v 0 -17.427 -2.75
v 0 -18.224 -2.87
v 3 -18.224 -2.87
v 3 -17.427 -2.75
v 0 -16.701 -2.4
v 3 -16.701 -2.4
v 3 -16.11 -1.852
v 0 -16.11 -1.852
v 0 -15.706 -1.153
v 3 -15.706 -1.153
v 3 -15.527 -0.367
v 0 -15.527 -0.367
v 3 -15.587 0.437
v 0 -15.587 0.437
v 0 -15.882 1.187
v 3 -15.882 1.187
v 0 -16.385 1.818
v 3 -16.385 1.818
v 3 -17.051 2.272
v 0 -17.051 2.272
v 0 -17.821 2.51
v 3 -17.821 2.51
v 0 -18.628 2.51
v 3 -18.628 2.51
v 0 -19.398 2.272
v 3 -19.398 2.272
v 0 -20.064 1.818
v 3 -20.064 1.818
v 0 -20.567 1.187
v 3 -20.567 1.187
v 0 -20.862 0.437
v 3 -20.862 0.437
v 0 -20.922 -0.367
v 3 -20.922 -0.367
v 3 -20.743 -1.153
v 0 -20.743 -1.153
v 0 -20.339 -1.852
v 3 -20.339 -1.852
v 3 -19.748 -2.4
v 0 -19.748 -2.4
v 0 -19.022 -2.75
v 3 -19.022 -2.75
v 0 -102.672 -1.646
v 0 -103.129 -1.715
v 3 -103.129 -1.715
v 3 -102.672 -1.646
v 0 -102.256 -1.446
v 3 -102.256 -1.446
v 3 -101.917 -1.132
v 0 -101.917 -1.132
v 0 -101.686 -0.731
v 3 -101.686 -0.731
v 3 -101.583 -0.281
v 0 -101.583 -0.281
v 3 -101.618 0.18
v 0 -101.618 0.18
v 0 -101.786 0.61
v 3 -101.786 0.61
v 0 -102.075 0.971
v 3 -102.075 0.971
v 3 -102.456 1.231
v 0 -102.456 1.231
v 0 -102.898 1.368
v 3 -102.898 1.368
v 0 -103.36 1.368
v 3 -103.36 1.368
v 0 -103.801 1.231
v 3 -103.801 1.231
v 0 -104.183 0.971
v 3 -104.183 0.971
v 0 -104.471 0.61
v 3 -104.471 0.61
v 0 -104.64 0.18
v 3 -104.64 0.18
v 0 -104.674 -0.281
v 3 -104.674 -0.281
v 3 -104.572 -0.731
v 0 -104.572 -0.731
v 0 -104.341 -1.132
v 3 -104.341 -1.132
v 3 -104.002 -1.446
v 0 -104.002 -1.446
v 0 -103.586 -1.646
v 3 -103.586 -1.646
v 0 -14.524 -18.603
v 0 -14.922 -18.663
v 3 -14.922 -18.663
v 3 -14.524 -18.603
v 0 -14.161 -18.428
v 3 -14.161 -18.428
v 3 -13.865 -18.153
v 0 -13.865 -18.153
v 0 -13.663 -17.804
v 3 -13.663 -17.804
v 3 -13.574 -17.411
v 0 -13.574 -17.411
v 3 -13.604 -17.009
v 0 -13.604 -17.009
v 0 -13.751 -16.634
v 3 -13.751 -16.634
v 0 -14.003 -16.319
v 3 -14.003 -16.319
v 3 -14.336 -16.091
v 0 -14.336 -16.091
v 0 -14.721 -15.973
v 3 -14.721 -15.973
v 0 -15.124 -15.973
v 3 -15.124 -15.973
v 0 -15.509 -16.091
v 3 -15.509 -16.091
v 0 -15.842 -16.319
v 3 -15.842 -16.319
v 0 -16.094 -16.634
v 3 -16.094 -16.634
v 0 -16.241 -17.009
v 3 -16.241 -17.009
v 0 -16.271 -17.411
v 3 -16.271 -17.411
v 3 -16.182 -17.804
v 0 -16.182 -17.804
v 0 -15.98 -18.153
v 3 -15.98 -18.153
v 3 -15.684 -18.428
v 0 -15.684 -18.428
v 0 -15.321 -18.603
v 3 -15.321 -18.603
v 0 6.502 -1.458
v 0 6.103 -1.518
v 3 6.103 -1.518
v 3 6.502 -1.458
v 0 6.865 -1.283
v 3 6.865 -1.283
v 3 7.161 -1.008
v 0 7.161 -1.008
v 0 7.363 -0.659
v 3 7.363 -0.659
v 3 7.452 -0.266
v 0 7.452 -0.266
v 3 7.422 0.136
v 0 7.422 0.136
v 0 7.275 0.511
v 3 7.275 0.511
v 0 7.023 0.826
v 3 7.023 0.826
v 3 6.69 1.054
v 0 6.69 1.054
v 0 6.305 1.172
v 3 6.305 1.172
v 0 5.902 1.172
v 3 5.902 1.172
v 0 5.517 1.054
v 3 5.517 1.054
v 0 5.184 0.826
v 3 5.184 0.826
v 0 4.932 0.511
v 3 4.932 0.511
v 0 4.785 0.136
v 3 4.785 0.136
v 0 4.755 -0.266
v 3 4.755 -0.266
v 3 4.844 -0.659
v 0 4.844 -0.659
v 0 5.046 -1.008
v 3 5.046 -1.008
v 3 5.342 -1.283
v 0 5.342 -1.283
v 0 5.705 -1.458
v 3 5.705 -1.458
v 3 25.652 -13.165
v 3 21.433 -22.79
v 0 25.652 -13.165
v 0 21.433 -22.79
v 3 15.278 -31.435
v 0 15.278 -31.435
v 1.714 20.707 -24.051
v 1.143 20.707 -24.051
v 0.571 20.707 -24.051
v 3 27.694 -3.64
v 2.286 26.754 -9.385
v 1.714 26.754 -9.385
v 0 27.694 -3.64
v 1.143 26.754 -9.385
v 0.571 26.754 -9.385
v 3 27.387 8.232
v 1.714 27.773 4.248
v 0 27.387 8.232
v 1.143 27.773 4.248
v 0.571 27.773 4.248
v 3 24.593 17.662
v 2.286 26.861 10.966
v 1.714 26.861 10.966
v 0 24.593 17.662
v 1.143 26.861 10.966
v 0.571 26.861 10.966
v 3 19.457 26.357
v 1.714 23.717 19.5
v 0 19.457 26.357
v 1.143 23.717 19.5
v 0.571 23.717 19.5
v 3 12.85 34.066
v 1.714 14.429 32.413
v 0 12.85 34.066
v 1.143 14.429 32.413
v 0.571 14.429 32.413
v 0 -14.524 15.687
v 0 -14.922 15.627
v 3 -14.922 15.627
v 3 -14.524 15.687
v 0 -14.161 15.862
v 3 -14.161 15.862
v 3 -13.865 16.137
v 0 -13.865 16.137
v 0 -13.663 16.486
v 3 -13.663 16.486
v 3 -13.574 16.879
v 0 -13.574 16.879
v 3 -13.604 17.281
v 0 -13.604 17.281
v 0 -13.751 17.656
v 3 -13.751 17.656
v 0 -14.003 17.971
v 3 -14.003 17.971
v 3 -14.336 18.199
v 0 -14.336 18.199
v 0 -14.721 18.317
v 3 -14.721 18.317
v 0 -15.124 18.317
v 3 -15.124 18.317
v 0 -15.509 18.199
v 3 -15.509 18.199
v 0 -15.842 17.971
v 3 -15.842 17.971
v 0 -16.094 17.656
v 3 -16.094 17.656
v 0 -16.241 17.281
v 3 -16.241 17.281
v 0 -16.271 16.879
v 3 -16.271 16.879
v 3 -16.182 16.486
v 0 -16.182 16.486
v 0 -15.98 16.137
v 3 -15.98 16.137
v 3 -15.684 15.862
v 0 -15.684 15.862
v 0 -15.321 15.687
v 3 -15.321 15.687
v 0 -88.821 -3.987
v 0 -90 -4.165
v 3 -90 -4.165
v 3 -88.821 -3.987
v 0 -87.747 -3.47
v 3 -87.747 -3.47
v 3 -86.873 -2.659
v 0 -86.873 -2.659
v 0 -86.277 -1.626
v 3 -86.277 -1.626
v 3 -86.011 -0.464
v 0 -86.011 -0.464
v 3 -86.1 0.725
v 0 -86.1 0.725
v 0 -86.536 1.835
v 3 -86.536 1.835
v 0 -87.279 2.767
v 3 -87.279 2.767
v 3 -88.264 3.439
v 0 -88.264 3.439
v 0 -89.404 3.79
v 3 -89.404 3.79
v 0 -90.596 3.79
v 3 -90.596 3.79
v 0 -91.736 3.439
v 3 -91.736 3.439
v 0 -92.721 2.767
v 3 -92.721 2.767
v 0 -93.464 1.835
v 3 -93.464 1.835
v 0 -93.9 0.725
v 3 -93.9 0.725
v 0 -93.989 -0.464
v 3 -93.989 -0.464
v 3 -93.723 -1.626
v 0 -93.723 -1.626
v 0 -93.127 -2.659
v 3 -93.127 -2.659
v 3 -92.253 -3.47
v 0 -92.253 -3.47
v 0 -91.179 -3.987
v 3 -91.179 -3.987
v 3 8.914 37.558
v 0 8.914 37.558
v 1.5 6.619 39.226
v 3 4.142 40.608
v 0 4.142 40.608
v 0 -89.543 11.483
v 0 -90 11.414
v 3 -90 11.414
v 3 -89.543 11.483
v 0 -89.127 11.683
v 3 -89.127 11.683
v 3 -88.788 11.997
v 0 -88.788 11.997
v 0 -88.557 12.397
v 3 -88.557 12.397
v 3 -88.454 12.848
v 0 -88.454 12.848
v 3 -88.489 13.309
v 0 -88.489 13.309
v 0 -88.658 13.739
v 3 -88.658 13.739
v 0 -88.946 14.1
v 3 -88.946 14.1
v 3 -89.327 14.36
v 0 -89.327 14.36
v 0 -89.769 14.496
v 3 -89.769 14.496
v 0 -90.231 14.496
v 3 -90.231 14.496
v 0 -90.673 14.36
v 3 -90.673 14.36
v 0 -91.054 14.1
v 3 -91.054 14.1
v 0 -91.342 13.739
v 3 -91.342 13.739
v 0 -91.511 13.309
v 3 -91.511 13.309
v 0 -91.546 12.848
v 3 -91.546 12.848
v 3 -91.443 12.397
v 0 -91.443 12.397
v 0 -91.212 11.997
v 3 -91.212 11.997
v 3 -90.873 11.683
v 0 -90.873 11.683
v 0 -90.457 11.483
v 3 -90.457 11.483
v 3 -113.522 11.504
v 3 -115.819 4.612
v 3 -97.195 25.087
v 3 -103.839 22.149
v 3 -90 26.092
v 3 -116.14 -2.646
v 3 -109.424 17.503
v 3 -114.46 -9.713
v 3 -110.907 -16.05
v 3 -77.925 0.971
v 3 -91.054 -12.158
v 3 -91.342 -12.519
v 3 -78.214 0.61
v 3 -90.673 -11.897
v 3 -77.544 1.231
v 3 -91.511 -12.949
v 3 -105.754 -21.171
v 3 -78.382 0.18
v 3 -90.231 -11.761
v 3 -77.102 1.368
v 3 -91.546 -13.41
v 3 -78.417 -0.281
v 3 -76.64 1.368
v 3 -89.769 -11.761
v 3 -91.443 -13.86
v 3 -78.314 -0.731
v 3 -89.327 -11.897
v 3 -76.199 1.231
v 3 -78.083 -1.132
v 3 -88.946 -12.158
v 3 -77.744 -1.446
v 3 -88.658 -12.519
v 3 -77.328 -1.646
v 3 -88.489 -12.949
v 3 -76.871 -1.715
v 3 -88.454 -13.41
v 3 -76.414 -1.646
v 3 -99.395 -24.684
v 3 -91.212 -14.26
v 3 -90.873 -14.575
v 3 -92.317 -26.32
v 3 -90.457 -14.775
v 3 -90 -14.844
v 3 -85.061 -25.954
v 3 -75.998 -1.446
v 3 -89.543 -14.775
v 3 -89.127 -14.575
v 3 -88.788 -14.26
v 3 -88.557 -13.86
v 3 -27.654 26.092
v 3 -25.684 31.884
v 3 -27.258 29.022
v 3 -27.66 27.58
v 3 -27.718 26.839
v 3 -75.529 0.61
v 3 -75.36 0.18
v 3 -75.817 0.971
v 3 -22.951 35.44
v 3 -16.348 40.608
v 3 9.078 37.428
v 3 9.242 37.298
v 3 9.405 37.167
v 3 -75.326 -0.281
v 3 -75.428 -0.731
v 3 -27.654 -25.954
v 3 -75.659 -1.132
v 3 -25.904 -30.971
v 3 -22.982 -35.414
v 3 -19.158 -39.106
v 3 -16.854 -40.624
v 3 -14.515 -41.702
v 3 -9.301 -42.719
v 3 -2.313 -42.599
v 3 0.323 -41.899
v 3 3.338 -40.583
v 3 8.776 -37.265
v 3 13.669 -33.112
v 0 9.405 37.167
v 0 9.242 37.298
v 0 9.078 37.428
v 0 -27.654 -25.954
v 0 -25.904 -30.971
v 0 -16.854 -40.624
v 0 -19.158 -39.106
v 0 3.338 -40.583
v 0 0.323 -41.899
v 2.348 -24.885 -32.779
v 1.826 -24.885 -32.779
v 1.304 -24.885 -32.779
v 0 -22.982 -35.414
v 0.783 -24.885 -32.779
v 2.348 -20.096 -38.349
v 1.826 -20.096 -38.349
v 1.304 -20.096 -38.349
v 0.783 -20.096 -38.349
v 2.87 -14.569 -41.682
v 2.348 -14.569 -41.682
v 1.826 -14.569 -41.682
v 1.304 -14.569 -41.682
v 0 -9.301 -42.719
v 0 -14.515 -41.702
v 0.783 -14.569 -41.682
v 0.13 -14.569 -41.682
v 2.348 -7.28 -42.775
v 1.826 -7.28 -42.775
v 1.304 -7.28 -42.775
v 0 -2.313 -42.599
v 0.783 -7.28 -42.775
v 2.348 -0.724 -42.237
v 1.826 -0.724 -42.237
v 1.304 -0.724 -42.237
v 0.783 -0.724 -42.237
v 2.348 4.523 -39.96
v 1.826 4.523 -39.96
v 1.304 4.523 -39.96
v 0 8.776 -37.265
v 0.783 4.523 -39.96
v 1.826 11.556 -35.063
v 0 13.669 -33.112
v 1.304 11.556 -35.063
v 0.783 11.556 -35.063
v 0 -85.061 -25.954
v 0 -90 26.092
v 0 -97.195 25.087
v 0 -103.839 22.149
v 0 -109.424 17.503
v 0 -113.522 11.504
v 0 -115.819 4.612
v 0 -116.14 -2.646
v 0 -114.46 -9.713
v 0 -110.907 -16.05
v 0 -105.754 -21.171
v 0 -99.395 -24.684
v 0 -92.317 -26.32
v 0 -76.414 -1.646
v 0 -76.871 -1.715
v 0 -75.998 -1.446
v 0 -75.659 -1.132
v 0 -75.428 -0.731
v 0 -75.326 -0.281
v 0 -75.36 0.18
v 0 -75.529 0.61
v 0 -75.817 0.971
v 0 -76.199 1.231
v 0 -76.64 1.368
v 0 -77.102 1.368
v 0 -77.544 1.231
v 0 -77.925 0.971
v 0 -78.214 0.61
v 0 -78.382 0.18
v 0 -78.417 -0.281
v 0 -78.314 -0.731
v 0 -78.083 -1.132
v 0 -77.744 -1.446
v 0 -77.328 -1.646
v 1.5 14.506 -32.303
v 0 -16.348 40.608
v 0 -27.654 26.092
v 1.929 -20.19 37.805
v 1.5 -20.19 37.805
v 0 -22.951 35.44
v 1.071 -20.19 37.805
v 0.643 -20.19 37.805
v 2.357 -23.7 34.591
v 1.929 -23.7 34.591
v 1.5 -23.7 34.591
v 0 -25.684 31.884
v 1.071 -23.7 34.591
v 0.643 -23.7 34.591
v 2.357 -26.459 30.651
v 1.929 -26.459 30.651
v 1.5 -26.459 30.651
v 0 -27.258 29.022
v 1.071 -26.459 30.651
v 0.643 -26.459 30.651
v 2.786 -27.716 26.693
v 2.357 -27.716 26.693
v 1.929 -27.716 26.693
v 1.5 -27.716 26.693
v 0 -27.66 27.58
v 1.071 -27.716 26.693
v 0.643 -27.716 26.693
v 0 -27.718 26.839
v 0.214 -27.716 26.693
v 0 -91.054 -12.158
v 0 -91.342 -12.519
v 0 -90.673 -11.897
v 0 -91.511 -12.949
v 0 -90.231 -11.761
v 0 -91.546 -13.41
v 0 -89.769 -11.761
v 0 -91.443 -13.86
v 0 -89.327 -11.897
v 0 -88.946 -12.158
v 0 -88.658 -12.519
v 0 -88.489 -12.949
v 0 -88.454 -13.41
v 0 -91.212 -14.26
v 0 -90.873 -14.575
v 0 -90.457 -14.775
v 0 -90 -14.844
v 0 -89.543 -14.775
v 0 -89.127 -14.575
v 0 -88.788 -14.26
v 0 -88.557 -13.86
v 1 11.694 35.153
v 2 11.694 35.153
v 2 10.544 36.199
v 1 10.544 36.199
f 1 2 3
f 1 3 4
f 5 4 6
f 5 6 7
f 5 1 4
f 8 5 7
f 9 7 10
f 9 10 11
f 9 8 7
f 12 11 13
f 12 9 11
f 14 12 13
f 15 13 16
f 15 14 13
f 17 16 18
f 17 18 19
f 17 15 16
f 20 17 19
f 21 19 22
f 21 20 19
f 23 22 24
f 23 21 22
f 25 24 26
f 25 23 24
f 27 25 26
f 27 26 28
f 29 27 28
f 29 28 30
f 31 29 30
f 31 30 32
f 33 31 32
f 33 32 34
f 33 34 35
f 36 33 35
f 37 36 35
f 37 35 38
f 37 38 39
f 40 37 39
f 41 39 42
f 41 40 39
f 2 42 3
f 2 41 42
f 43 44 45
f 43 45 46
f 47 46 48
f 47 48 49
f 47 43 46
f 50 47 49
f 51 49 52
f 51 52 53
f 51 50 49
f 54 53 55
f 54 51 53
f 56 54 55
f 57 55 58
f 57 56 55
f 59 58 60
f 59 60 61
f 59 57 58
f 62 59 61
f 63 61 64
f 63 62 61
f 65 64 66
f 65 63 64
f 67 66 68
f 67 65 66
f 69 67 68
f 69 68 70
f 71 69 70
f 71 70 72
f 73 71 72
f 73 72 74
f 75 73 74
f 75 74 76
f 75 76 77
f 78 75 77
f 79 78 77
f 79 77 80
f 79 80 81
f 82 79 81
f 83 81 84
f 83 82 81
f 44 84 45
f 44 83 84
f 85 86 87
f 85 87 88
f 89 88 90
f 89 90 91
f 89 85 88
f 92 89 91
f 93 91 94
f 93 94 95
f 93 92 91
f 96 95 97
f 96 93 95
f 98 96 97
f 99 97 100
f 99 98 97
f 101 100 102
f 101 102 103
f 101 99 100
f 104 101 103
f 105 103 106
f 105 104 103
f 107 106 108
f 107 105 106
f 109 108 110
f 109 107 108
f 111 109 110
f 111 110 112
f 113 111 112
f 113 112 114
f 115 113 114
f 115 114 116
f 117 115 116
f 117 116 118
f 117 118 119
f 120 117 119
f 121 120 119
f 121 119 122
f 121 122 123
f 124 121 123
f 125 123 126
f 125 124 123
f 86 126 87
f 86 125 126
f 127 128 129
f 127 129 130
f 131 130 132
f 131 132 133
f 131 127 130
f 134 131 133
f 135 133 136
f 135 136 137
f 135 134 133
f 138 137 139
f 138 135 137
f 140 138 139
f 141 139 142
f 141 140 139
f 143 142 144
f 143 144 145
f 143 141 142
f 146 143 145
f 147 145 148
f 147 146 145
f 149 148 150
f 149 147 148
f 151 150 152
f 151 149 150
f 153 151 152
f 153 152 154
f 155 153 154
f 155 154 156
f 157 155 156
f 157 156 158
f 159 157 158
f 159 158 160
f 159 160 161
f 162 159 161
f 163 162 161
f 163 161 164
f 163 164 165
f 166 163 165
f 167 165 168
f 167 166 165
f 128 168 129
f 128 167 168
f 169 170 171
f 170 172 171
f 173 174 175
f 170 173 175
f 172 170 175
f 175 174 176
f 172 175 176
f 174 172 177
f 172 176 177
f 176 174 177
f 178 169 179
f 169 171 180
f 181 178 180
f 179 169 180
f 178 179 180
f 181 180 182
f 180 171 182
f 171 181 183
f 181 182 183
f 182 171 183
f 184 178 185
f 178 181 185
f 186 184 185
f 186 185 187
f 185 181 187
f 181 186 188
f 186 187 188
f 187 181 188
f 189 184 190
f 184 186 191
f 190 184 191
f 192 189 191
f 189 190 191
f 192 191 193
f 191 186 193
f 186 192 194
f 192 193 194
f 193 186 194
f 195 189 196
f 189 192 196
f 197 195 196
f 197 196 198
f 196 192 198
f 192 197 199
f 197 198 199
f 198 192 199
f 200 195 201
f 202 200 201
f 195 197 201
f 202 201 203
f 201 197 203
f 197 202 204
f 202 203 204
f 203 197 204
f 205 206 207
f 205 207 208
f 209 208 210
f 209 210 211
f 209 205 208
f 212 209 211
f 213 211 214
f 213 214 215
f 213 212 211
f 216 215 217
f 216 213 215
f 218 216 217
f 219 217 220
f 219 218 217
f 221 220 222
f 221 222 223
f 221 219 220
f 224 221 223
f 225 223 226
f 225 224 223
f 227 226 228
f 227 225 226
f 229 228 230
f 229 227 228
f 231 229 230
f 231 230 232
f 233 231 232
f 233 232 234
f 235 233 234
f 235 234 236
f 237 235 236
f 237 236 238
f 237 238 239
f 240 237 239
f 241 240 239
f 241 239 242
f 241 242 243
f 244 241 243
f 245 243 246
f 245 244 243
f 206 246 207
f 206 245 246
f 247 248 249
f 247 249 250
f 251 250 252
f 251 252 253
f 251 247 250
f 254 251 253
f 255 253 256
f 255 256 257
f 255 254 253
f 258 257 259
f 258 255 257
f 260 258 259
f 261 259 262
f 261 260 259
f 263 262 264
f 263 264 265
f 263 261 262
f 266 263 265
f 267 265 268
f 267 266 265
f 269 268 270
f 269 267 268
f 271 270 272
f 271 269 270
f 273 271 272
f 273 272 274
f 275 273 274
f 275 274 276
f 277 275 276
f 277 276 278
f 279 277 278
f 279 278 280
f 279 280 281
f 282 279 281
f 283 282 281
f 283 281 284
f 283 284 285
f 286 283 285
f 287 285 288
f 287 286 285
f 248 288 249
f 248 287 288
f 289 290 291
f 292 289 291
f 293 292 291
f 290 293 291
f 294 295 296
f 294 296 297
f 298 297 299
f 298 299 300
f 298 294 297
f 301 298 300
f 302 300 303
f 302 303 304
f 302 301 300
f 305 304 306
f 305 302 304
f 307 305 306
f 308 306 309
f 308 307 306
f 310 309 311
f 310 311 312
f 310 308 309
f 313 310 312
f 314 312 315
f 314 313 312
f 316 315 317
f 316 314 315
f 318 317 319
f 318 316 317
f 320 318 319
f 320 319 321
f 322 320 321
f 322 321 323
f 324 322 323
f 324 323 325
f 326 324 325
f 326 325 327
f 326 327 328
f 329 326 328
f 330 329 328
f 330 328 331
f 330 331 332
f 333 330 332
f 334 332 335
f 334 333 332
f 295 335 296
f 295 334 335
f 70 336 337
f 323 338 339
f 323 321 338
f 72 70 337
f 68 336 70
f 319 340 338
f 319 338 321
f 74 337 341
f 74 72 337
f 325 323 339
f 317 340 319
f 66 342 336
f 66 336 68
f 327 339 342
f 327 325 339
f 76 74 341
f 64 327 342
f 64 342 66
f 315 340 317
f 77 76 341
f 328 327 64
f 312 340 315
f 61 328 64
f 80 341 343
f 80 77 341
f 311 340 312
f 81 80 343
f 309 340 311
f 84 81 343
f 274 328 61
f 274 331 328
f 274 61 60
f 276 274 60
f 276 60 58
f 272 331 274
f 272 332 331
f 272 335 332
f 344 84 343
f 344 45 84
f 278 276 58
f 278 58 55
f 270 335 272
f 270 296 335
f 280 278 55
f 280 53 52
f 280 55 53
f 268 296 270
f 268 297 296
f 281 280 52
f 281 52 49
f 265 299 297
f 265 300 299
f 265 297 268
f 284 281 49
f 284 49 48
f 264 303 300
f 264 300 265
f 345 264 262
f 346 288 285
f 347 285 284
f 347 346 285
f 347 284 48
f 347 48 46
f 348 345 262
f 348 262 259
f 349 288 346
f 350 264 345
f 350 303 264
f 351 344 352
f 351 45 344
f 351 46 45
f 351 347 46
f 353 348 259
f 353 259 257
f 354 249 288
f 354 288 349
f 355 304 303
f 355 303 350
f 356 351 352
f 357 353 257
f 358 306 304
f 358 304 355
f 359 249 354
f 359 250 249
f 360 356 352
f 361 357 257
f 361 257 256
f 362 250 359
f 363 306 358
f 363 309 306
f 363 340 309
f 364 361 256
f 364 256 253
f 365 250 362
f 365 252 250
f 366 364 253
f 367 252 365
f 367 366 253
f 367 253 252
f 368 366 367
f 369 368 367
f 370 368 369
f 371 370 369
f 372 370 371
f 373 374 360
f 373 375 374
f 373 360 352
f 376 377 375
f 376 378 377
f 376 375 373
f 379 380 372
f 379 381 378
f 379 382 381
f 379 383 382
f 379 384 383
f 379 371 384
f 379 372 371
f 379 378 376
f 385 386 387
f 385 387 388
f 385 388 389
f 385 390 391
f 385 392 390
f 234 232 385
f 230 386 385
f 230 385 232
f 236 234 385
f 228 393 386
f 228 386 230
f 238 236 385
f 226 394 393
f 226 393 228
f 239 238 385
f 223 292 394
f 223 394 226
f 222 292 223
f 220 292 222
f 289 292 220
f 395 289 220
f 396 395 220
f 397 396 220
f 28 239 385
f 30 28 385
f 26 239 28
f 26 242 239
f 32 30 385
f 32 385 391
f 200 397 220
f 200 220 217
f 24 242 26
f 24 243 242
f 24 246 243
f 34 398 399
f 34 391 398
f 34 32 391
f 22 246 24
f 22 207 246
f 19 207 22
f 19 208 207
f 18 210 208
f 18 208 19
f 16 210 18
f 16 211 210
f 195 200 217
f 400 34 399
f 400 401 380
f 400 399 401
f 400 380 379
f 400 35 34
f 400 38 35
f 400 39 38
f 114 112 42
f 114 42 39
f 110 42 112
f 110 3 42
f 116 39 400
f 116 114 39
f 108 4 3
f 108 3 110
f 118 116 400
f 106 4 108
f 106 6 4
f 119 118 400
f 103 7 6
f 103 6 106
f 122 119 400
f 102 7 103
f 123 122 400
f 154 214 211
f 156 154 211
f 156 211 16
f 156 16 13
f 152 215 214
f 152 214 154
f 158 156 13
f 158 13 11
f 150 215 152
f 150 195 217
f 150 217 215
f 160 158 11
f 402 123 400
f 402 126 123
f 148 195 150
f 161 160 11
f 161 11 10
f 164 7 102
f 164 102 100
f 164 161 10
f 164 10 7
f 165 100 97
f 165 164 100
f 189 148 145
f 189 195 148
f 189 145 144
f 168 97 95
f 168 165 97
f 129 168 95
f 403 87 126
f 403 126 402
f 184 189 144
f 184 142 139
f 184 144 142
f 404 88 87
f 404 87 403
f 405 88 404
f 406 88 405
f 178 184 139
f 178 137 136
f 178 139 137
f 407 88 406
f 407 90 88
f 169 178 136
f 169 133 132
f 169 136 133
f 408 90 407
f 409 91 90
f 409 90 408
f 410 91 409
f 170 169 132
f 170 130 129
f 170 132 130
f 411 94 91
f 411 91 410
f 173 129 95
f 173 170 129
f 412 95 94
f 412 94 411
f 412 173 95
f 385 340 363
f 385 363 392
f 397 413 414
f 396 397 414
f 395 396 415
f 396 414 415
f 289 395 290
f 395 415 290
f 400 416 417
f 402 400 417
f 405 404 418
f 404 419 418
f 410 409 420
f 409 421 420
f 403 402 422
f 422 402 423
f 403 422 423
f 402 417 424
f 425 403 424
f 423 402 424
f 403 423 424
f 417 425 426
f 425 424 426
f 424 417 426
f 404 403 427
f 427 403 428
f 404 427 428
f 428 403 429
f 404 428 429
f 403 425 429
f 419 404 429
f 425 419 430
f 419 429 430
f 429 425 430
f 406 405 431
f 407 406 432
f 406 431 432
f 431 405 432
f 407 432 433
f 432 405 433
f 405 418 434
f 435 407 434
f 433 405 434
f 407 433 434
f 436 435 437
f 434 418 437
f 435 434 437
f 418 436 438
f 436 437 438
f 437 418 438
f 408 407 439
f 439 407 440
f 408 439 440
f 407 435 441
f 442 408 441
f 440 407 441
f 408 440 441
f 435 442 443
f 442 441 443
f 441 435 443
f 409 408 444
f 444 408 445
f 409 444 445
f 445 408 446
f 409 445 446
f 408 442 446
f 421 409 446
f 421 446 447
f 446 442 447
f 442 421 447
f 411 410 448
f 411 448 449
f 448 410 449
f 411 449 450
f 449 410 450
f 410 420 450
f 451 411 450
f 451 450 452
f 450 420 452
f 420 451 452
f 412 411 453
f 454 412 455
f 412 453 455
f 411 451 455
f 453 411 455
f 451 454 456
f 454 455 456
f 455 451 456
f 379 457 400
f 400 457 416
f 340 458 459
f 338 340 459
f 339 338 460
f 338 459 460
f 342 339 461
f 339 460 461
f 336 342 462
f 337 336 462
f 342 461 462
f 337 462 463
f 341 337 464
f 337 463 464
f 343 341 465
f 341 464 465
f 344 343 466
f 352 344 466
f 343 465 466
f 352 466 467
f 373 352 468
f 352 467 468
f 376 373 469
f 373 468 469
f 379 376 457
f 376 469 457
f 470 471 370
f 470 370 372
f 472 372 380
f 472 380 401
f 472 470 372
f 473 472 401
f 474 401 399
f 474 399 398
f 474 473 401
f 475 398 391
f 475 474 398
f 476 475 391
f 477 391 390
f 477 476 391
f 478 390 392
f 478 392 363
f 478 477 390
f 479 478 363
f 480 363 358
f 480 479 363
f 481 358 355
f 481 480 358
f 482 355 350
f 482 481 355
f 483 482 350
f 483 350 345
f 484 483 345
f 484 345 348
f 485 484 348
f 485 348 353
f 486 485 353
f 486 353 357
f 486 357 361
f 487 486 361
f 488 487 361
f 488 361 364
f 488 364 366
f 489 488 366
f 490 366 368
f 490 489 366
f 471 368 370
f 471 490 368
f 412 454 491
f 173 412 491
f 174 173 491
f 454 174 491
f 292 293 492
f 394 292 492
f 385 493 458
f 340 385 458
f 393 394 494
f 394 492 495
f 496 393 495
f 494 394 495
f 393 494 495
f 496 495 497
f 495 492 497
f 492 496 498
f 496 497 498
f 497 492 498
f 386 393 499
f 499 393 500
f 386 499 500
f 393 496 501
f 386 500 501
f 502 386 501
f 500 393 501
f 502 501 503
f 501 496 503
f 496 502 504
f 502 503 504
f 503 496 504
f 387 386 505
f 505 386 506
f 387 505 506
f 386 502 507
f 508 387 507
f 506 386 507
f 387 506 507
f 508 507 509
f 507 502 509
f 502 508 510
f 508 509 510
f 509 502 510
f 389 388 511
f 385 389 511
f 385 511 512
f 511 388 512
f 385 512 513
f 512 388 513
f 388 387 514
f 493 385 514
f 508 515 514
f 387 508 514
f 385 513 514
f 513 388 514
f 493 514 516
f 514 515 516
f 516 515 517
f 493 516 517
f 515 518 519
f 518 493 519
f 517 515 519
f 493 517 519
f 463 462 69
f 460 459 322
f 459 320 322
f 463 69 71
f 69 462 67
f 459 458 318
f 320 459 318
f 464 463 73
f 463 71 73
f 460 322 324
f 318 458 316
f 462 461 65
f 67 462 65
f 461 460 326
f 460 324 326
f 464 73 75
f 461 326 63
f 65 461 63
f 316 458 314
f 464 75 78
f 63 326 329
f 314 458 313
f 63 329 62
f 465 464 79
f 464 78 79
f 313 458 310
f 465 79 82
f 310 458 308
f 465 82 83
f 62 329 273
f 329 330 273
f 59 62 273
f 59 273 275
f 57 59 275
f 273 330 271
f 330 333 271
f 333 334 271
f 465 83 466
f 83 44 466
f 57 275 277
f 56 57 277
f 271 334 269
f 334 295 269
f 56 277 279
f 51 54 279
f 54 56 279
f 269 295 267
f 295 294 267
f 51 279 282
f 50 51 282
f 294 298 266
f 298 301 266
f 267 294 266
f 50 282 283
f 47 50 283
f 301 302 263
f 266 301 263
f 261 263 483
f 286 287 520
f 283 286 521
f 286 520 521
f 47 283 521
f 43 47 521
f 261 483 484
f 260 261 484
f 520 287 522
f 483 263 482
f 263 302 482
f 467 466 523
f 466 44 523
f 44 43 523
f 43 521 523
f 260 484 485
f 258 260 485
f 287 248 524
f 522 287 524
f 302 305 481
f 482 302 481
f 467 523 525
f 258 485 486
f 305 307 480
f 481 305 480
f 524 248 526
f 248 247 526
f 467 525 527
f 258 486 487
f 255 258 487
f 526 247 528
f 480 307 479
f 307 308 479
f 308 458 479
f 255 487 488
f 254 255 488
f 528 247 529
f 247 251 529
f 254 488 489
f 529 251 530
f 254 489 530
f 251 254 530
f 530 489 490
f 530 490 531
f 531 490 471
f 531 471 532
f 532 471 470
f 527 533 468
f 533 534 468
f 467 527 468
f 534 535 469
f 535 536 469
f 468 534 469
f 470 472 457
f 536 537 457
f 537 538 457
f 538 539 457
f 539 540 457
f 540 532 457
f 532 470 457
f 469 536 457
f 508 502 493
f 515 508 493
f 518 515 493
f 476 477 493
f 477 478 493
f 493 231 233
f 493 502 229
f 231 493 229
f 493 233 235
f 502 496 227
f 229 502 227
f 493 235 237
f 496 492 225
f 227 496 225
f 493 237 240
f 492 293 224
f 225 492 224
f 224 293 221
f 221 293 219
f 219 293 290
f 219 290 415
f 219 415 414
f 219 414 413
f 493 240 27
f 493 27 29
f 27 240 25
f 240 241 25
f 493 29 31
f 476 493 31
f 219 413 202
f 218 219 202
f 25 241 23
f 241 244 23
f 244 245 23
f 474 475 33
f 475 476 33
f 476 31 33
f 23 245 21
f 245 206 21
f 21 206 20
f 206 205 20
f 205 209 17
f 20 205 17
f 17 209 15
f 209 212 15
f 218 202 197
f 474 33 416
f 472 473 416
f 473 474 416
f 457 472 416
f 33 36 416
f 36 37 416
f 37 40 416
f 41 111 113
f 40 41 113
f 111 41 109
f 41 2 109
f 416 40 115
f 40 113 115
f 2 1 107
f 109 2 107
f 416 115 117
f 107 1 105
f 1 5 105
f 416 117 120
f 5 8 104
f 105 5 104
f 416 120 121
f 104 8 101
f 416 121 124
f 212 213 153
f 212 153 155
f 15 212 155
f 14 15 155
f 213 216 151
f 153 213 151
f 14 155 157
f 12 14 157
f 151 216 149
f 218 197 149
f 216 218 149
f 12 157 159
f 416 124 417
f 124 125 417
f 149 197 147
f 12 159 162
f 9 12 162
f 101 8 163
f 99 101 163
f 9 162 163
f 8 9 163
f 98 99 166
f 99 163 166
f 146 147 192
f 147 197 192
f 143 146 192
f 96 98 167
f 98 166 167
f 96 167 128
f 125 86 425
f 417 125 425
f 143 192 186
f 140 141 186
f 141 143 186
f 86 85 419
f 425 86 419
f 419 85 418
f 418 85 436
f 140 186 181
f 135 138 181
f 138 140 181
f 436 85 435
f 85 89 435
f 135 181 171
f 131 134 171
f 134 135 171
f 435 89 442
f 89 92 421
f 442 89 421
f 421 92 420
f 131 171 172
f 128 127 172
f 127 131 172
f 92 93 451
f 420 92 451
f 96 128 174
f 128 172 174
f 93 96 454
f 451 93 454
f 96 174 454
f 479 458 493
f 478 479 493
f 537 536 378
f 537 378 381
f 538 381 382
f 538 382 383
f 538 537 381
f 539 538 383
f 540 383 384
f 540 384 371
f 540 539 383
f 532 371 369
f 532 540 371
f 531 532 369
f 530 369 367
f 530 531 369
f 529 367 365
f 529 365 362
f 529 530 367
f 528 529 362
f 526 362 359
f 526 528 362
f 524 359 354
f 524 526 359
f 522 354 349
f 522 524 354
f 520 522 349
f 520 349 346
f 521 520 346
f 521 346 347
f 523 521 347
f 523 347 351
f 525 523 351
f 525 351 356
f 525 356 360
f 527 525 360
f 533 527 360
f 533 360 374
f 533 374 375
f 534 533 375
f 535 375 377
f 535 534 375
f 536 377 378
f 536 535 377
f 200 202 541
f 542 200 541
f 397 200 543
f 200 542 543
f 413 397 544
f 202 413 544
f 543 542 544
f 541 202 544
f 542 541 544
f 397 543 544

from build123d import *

# Parameters (mm, degrees)
ESQUISSE1_R        = 1.55
ESQUISSE1_R_2      = 4
ESQUISSE1_R_3      = 1.35255
ESQUISSE1_R_4      = 2.7051
BOSS_EXTRU_1_DEPTH = 3


with BuildPart() as part:
    # Esquisse1 → Boss.-Extru.1 (new body)
    with BuildSketch(Plane(origin=(0, 0, 0), x_dir=(0, 0, -1), z_dir=(1, 0, 0))):
        with BuildLine():
            Line((-40.60825, -12.7), (-40.60825, -16.144875))
            Line((-40.60825, -16.144875), (-40.60825, -16.348305132))
            add(Edge.make_bspline(
                [(-40.60825, -16.348305132), (-40.365634485, -16.661193605), (-40.112338127, -16.96547542), (-39.63020507, -17.593748723), (-39.400688032, -17.917191992), (-38.719045939, -18.893089111), (-38.271947044, -19.549593057), (-37.338540998, -20.831006808), (-36.855460104, -21.458516341), (-36.059725811, -22.342477591), (-35.781944124, -22.627029047), (-35.202868212, -23.17718548), (-34.900674383, -23.443503751), (-33.971943166, -24.212706181), (-33.324405882, -24.685383849), (-32.010805282, -25.604549776), (-31.348089528, -26.055770333), (-30.303090708, -26.660610546), (-29.948270215, -26.848696892), (-29.222483721, -27.184971005), (-28.851412004, -27.333773538), (-28.083597976, -27.570691368), (-27.685315555, -27.657976057), (-27.090666934, -27.715403346), (-26.891908645, -27.722631025), (-26.592836888, -27.712936491), (-26.492990431, -27.706278992), (-26.292963936, -27.685632014), (-26.192732932, -27.670522326), (-26.092449031, -27.65425)],
                knots=[0, 0, 0, 0, 0.0625, 0.0625, 0.125, 0.125, 0.25, 0.25, 0.375, 0.375, 0.4375, 0.4375, 0.5, 0.5, 0.625, 0.625, 0.75, 0.75, 0.8125, 0.8125, 0.875, 0.875, 0.9375, 0.9375, 0.96875, 0.96875, 0.984375, 0.984375, 1, 1, 1, 1], degree=3))
            Line((-26.092449031, -27.65425), (-26.092449031, -90))
            ThreePointArc((-26.092449031, -90), (2.64551669, -116.14013034), (25.954024412, -85.06135051))
            Line((25.954024412, -85.06135051), (25.954024412, -27.65425))
            add(Edge.make_bspline(
                [(25.954024412, -27.65425), (27.179118802, -27.419536533), (28.353377808, -27.051803075), (30.05705383, -26.34918771), (30.615126485, -26.089288473), (31.712904721, -25.521429223), (32.254485024, -25.212118815), (33.827204106, -24.230350536), (34.814025463, -23.502087852), (36.672007358, -21.907218093), (37.543320305, -21.040793316), (38.751902771, -19.623473398), (39.134714509, -19.134962989), (39.851014333, -18.131439591), (40.185535135, -17.615291382), (40.801362362, -16.550595558), (41.082635497, -16.002027673), (41.457015911, -15.150237789), (41.574249194, -14.86042264), (41.789713906, -14.277065554), (41.888049248, -13.98351322), (42.334688534, -12.506770959), (42.546239761, -11.296312151), (42.717568356, -9.451511475), (42.750611649, -8.83067761), (42.772859866, -7.900507946), (42.775360474, -7.590422151), (42.77555993, -6.970221998), (42.772087252, -6.66010067), (42.772087252, -6.35)],
                knots=[0, 0, 0, 0, 0.125, 0.125, 0.1875, 0.1875, 0.25, 0.25, 0.375, 0.375, 0.5, 0.5, 0.5625, 0.5625, 0.625, 0.625, 0.6875, 0.6875, 0.71875, 0.71875, 0.75, 0.75, 0.875, 0.875, 0.9375, 0.9375, 0.96875, 0.96875, 1, 1, 1, 1], degree=3))
            add(Edge.make_bspline(
                [(42.772087252, -6.35), (42.772087252, -5.874878454), (42.783792207, -5.398095979), (42.789657917, -4.447020546), (42.781867467, -3.973004463), (42.672546396, -2.563152451), (42.499179213, -1.637510108), (42.106282017, -0.267897459), (41.954068536, 0.185625042), (41.614819435, 1.087728793), (41.430081297, 1.530283034), (40.844911495, 2.839259084), (40.416604561, 3.689518781), (39.046783283, 6.190525131), (38.013123304, 7.787251584), (36.291657446, 10.082106977), (35.688509547, 10.830664164), (34.43654182, 12.281738953), (33.786199883, 12.985690235), (33.112075, 13.668565083)],
                knots=[0, 0, 0, 0, 0.0625, 0.0625, 0.125, 0.125, 0.25, 0.25, 0.3125, 0.3125, 0.375, 0.375, 0.5, 0.5, 0.75, 0.75, 0.875, 0.875, 1, 1, 1, 1], degree=3))
            add(Edge.make_bspline(
                [(33.112075, 13.668565083), (32.332207955, 14.539101946), (31.435060987, 15.277734234)],
                knots=[0, 0, 0, 1, 1, 1], degree=2))
            add(Edge.make_bspline(
                [(31.435060987, 15.277734234), (30.299691041, 16.309376592), (29.113704516, 17.275445235), (26.646604831, 19.084346085), (25.360475951, 19.928267183), (21.432297769, 22.265681686), (18.70167828, 23.563722979), (14.477833082, 25.213127628), (13.049229105, 25.71486416), (10.864398428, 26.369911185), (10.129061703, 26.571832136), (8.64156399, 26.936524394), (7.890831572, 27.098844789), (5.637990782, 27.512412208), (4.127431428, 27.693727696), (2.225306731, 27.768676851), (1.844136038, 27.775542931), (1.080940786, 27.779973661), (0.698904769, 27.777413484), (-0.446346689, 27.779064109), (-1.208874123, 27.797823926), (-2.732682239, 27.815308111), (-3.492085471, 27.806304753), (-5.004084105, 27.739990771), (-5.756994671, 27.684916502), (-8.006157922, 27.451797552), (-9.492662784, 27.204583891), (-11.701987236, 26.688775277), (-12.434852331, 26.491461598), (-13.894254142, 26.051929085), (-14.622118919, 25.807493497), (-16.765417144, 25.01223388), (-18.151500369, 24.400517874), (-20.847821735, 23.032525232), (-22.158708475, 22.277484827), (-24.716496252, 20.645447351), (-25.966430559, 19.7652326), (-28.39125747, 17.919703458), (-29.567431908, 16.954258357), (-31.287557173, 15.454109034), (-31.85380584, 14.945666112), (-32.972832423, 13.91291508), (-33.52577931, 13.388805977), (-34.066096443, 12.849822171)],
                knots=[0, 0, 0, 0, 0.0625, 0.0625, 0.125, 0.125, 0.25, 0.25, 0.3125, 0.3125, 0.34375, 0.34375, 0.375, 0.375, 0.4375, 0.4375, 0.453125, 0.453125, 0.46875, 0.46875, 0.5, 0.5, 0.53125, 0.53125, 0.5625, 0.5625, 0.625, 0.625, 0.65625, 0.65625, 0.6875, 0.6875, 0.75, 0.75, 0.8125, 0.8125, 0.875, 0.875, 0.9375, 0.9375, 0.96875, 0.96875, 1, 1, 1, 1], degree=3))
            add(Edge.make_bspline(
                [(-34.066096443, 12.849822171), (-35.159801618, 11.692162737), (-36.251081621, 10.53740284), (-37.166580532, 9.404947171)],
                knots=[0, 0, 0, 0, 1, 1, 1, 1], degree=3))
            ThreePointArc((-37.166580532, 9.404947171), (-37.363014685, 9.160281042), (-37.557796616, 8.914297524))
            add(Edge.make_bspline(
                [(-37.557796616, 8.914297524), (-38.142933539, 8.170182683), (-38.709522845, 7.412667282), (-39.741912272, 5.824816801), (-40.203133529, 4.998794666), (-40.60825, 4.142494902)],
                knots=[0, 0, 0, 0, 0.5, 0.5, 1, 1, 1, 1], degree=3))
            Line((-40.60825, 4.142494902), (-40.60825, -12.7))
        make_face()
        with Locations((0.1651, -103.128774516)):
            Circle(ESQUISSE1_R, mode=Mode.SUBTRACT)
        with Locations((-12.963674516, -90)):
            Circle(ESQUISSE1_R, mode=Mode.SUBTRACT)
        with Locations((0.1651, -90)):
            Circle(ESQUISSE1_R_2, mode=Mode.SUBTRACT)
        with Locations((0.1651, -76.871225484)):
            Circle(ESQUISSE1_R, mode=Mode.SUBTRACT)
        with Locations((13.293874516, -90)):
            Circle(ESQUISSE1_R, mode=Mode.SUBTRACT)
        with Locations((-16.9799, -14.9225)):
            Circle(ESQUISSE1_R_3, mode=Mode.SUBTRACT)
        with Locations((0.1651, -18.2245)):
            Circle(ESQUISSE1_R_4, mode=Mode.SUBTRACT)
        with Locations((0.1651, 6.103472306)):
            Circle(ESQUISSE1_R_3, mode=Mode.SUBTRACT)
        with Locations((17.3101, -14.9225)):
            Circle(ESQUISSE1_R_3, mode=Mode.SUBTRACT)
    extrude(amount=BOSS_EXTRU_1_DEPTH)


solid = part.part
